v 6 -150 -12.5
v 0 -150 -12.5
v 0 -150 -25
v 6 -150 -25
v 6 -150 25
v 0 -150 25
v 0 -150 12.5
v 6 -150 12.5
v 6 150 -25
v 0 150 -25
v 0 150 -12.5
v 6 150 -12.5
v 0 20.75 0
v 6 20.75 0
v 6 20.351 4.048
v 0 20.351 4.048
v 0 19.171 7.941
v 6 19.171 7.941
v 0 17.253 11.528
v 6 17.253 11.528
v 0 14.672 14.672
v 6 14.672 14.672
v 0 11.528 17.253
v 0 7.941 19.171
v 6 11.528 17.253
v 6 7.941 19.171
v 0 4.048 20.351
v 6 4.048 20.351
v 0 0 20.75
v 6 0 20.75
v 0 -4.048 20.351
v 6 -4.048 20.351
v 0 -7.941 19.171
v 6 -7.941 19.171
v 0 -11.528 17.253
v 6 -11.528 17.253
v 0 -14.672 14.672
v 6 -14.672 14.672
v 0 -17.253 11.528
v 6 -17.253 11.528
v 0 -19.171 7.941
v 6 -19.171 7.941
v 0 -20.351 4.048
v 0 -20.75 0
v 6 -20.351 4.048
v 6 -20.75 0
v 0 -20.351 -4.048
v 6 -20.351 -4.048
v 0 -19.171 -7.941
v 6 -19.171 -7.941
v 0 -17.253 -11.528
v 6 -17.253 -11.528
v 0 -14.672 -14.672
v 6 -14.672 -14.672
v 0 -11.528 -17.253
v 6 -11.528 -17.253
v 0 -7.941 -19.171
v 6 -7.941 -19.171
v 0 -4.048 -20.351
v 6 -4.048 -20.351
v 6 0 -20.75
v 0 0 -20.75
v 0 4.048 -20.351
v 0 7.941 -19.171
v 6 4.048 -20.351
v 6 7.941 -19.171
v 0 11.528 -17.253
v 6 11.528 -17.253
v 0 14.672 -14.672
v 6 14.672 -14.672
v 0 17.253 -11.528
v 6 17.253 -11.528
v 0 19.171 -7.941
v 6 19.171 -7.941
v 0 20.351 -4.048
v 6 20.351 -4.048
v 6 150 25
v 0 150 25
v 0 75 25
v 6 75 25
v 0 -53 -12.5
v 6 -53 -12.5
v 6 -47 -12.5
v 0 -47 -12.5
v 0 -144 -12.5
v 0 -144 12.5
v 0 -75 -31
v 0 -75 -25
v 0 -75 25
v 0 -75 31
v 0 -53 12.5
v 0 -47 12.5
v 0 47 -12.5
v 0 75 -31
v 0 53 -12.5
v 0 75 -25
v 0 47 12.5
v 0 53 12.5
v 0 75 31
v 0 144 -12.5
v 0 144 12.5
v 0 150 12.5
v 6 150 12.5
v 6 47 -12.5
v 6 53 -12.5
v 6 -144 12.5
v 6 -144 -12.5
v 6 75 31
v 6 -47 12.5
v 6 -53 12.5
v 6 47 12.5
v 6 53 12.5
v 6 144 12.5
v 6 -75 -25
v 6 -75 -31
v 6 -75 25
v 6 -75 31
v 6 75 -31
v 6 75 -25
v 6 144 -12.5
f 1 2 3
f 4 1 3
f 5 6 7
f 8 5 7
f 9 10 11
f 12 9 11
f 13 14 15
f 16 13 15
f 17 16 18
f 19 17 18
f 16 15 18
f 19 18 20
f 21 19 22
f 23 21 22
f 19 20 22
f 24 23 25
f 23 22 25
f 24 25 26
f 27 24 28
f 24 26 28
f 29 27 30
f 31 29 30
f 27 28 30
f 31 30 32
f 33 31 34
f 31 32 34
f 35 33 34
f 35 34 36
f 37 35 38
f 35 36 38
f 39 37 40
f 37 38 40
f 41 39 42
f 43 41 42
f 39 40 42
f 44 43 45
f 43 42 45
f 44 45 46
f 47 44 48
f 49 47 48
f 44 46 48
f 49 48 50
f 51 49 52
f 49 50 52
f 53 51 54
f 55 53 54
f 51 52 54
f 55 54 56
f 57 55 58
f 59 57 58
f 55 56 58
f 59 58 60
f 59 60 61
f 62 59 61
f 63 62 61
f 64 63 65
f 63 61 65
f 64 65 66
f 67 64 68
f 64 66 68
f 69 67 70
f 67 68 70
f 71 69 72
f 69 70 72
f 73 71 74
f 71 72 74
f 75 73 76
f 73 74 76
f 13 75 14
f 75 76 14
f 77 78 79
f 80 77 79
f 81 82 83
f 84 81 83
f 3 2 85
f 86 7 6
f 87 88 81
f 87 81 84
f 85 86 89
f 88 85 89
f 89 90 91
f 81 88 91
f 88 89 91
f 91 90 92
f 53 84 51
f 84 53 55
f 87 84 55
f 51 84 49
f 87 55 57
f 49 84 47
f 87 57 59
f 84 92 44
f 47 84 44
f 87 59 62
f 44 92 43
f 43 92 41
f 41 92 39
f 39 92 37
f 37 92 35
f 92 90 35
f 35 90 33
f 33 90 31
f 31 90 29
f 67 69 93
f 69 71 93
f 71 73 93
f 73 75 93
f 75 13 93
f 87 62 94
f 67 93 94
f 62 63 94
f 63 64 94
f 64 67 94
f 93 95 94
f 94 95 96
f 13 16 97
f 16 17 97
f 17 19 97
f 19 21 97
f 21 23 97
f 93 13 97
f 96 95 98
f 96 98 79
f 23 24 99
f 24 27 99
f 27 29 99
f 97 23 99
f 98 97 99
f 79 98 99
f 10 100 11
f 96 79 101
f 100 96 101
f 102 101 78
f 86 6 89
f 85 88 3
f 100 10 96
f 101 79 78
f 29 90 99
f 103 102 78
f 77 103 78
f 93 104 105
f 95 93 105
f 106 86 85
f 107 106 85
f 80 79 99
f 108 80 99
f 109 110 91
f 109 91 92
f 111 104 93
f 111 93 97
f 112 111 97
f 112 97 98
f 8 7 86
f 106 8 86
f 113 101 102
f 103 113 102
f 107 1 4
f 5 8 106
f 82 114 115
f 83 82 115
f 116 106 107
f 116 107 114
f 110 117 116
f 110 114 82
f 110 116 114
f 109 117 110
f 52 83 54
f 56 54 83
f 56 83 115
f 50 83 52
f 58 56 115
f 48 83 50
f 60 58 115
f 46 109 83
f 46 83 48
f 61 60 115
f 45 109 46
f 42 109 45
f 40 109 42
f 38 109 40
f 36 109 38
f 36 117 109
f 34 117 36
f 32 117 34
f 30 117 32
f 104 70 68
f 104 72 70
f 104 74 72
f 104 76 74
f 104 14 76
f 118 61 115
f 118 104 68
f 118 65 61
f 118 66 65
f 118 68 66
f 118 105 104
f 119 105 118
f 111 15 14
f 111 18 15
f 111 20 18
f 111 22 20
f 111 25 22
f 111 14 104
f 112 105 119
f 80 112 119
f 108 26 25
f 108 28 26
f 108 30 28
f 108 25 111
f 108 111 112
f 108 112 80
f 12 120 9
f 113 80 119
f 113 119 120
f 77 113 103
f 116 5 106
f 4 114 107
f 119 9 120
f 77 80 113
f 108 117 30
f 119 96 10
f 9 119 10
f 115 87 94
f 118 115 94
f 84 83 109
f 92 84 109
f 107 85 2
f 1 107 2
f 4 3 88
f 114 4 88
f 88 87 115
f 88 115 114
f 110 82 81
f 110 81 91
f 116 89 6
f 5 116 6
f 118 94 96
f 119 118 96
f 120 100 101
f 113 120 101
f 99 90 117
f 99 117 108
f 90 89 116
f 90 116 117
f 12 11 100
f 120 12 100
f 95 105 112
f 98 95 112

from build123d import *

# Parameters (mm, degrees)
F0_W     = 150
F0_H     = 6
F1_DEPTH = 6
F2_R     = 20.75
F3_DEPTH = 6
F4_W     = 6
F4_H     = 25
F5_DEPTH = 6


with BuildPart() as f1:
    # F0 (on Right) → F1 (new body)
    with BuildSketch(Plane.YZ):
        Polygon((-75, 25), (-150, 25), (-150, 12.5), (-144, 12.5), (-144, -12.5), (-150, -12.5), (-150, -25), (-75, -25), (-75, -19), (75, -19), (75, -25), (150, -25), (150, -12.5), (144, -12.5), (144, 12.5), (150, 12.5), (150, 25), (75, 25), (75, 19), (-75, 19), align=None)
        with Locations((0, 28)):
            Rectangle(F0_W, F0_H)
        with Locations((0, 22)):
            Rectangle(F0_W, F0_H)
        with Locations((0, -28)):
            Rectangle(F0_W, F0_H)
        with Locations((0, -22)):
            Rectangle(F0_W, F0_H)
    extrude(amount=F1_DEPTH)

    # F2 (on face) → F3 (cut, through all)
    with BuildSketch(Plane.YZ.offset(6)):
        Circle(F2_R)
    extrude(amount=-F3_DEPTH, mode=Mode.SUBTRACT)

    # F4 (on face) → F5 (cut, through all)
    with BuildSketch(Plane.YZ.offset(6)):
        with Locations((-50, 0)):
            Rectangle(F4_W, F4_H)
        with Locations((50, 0)):
            Rectangle(F4_W, F4_H)
    extrude(amount=-F5_DEPTH, mode=Mode.SUBTRACT)


solid = f1.part
